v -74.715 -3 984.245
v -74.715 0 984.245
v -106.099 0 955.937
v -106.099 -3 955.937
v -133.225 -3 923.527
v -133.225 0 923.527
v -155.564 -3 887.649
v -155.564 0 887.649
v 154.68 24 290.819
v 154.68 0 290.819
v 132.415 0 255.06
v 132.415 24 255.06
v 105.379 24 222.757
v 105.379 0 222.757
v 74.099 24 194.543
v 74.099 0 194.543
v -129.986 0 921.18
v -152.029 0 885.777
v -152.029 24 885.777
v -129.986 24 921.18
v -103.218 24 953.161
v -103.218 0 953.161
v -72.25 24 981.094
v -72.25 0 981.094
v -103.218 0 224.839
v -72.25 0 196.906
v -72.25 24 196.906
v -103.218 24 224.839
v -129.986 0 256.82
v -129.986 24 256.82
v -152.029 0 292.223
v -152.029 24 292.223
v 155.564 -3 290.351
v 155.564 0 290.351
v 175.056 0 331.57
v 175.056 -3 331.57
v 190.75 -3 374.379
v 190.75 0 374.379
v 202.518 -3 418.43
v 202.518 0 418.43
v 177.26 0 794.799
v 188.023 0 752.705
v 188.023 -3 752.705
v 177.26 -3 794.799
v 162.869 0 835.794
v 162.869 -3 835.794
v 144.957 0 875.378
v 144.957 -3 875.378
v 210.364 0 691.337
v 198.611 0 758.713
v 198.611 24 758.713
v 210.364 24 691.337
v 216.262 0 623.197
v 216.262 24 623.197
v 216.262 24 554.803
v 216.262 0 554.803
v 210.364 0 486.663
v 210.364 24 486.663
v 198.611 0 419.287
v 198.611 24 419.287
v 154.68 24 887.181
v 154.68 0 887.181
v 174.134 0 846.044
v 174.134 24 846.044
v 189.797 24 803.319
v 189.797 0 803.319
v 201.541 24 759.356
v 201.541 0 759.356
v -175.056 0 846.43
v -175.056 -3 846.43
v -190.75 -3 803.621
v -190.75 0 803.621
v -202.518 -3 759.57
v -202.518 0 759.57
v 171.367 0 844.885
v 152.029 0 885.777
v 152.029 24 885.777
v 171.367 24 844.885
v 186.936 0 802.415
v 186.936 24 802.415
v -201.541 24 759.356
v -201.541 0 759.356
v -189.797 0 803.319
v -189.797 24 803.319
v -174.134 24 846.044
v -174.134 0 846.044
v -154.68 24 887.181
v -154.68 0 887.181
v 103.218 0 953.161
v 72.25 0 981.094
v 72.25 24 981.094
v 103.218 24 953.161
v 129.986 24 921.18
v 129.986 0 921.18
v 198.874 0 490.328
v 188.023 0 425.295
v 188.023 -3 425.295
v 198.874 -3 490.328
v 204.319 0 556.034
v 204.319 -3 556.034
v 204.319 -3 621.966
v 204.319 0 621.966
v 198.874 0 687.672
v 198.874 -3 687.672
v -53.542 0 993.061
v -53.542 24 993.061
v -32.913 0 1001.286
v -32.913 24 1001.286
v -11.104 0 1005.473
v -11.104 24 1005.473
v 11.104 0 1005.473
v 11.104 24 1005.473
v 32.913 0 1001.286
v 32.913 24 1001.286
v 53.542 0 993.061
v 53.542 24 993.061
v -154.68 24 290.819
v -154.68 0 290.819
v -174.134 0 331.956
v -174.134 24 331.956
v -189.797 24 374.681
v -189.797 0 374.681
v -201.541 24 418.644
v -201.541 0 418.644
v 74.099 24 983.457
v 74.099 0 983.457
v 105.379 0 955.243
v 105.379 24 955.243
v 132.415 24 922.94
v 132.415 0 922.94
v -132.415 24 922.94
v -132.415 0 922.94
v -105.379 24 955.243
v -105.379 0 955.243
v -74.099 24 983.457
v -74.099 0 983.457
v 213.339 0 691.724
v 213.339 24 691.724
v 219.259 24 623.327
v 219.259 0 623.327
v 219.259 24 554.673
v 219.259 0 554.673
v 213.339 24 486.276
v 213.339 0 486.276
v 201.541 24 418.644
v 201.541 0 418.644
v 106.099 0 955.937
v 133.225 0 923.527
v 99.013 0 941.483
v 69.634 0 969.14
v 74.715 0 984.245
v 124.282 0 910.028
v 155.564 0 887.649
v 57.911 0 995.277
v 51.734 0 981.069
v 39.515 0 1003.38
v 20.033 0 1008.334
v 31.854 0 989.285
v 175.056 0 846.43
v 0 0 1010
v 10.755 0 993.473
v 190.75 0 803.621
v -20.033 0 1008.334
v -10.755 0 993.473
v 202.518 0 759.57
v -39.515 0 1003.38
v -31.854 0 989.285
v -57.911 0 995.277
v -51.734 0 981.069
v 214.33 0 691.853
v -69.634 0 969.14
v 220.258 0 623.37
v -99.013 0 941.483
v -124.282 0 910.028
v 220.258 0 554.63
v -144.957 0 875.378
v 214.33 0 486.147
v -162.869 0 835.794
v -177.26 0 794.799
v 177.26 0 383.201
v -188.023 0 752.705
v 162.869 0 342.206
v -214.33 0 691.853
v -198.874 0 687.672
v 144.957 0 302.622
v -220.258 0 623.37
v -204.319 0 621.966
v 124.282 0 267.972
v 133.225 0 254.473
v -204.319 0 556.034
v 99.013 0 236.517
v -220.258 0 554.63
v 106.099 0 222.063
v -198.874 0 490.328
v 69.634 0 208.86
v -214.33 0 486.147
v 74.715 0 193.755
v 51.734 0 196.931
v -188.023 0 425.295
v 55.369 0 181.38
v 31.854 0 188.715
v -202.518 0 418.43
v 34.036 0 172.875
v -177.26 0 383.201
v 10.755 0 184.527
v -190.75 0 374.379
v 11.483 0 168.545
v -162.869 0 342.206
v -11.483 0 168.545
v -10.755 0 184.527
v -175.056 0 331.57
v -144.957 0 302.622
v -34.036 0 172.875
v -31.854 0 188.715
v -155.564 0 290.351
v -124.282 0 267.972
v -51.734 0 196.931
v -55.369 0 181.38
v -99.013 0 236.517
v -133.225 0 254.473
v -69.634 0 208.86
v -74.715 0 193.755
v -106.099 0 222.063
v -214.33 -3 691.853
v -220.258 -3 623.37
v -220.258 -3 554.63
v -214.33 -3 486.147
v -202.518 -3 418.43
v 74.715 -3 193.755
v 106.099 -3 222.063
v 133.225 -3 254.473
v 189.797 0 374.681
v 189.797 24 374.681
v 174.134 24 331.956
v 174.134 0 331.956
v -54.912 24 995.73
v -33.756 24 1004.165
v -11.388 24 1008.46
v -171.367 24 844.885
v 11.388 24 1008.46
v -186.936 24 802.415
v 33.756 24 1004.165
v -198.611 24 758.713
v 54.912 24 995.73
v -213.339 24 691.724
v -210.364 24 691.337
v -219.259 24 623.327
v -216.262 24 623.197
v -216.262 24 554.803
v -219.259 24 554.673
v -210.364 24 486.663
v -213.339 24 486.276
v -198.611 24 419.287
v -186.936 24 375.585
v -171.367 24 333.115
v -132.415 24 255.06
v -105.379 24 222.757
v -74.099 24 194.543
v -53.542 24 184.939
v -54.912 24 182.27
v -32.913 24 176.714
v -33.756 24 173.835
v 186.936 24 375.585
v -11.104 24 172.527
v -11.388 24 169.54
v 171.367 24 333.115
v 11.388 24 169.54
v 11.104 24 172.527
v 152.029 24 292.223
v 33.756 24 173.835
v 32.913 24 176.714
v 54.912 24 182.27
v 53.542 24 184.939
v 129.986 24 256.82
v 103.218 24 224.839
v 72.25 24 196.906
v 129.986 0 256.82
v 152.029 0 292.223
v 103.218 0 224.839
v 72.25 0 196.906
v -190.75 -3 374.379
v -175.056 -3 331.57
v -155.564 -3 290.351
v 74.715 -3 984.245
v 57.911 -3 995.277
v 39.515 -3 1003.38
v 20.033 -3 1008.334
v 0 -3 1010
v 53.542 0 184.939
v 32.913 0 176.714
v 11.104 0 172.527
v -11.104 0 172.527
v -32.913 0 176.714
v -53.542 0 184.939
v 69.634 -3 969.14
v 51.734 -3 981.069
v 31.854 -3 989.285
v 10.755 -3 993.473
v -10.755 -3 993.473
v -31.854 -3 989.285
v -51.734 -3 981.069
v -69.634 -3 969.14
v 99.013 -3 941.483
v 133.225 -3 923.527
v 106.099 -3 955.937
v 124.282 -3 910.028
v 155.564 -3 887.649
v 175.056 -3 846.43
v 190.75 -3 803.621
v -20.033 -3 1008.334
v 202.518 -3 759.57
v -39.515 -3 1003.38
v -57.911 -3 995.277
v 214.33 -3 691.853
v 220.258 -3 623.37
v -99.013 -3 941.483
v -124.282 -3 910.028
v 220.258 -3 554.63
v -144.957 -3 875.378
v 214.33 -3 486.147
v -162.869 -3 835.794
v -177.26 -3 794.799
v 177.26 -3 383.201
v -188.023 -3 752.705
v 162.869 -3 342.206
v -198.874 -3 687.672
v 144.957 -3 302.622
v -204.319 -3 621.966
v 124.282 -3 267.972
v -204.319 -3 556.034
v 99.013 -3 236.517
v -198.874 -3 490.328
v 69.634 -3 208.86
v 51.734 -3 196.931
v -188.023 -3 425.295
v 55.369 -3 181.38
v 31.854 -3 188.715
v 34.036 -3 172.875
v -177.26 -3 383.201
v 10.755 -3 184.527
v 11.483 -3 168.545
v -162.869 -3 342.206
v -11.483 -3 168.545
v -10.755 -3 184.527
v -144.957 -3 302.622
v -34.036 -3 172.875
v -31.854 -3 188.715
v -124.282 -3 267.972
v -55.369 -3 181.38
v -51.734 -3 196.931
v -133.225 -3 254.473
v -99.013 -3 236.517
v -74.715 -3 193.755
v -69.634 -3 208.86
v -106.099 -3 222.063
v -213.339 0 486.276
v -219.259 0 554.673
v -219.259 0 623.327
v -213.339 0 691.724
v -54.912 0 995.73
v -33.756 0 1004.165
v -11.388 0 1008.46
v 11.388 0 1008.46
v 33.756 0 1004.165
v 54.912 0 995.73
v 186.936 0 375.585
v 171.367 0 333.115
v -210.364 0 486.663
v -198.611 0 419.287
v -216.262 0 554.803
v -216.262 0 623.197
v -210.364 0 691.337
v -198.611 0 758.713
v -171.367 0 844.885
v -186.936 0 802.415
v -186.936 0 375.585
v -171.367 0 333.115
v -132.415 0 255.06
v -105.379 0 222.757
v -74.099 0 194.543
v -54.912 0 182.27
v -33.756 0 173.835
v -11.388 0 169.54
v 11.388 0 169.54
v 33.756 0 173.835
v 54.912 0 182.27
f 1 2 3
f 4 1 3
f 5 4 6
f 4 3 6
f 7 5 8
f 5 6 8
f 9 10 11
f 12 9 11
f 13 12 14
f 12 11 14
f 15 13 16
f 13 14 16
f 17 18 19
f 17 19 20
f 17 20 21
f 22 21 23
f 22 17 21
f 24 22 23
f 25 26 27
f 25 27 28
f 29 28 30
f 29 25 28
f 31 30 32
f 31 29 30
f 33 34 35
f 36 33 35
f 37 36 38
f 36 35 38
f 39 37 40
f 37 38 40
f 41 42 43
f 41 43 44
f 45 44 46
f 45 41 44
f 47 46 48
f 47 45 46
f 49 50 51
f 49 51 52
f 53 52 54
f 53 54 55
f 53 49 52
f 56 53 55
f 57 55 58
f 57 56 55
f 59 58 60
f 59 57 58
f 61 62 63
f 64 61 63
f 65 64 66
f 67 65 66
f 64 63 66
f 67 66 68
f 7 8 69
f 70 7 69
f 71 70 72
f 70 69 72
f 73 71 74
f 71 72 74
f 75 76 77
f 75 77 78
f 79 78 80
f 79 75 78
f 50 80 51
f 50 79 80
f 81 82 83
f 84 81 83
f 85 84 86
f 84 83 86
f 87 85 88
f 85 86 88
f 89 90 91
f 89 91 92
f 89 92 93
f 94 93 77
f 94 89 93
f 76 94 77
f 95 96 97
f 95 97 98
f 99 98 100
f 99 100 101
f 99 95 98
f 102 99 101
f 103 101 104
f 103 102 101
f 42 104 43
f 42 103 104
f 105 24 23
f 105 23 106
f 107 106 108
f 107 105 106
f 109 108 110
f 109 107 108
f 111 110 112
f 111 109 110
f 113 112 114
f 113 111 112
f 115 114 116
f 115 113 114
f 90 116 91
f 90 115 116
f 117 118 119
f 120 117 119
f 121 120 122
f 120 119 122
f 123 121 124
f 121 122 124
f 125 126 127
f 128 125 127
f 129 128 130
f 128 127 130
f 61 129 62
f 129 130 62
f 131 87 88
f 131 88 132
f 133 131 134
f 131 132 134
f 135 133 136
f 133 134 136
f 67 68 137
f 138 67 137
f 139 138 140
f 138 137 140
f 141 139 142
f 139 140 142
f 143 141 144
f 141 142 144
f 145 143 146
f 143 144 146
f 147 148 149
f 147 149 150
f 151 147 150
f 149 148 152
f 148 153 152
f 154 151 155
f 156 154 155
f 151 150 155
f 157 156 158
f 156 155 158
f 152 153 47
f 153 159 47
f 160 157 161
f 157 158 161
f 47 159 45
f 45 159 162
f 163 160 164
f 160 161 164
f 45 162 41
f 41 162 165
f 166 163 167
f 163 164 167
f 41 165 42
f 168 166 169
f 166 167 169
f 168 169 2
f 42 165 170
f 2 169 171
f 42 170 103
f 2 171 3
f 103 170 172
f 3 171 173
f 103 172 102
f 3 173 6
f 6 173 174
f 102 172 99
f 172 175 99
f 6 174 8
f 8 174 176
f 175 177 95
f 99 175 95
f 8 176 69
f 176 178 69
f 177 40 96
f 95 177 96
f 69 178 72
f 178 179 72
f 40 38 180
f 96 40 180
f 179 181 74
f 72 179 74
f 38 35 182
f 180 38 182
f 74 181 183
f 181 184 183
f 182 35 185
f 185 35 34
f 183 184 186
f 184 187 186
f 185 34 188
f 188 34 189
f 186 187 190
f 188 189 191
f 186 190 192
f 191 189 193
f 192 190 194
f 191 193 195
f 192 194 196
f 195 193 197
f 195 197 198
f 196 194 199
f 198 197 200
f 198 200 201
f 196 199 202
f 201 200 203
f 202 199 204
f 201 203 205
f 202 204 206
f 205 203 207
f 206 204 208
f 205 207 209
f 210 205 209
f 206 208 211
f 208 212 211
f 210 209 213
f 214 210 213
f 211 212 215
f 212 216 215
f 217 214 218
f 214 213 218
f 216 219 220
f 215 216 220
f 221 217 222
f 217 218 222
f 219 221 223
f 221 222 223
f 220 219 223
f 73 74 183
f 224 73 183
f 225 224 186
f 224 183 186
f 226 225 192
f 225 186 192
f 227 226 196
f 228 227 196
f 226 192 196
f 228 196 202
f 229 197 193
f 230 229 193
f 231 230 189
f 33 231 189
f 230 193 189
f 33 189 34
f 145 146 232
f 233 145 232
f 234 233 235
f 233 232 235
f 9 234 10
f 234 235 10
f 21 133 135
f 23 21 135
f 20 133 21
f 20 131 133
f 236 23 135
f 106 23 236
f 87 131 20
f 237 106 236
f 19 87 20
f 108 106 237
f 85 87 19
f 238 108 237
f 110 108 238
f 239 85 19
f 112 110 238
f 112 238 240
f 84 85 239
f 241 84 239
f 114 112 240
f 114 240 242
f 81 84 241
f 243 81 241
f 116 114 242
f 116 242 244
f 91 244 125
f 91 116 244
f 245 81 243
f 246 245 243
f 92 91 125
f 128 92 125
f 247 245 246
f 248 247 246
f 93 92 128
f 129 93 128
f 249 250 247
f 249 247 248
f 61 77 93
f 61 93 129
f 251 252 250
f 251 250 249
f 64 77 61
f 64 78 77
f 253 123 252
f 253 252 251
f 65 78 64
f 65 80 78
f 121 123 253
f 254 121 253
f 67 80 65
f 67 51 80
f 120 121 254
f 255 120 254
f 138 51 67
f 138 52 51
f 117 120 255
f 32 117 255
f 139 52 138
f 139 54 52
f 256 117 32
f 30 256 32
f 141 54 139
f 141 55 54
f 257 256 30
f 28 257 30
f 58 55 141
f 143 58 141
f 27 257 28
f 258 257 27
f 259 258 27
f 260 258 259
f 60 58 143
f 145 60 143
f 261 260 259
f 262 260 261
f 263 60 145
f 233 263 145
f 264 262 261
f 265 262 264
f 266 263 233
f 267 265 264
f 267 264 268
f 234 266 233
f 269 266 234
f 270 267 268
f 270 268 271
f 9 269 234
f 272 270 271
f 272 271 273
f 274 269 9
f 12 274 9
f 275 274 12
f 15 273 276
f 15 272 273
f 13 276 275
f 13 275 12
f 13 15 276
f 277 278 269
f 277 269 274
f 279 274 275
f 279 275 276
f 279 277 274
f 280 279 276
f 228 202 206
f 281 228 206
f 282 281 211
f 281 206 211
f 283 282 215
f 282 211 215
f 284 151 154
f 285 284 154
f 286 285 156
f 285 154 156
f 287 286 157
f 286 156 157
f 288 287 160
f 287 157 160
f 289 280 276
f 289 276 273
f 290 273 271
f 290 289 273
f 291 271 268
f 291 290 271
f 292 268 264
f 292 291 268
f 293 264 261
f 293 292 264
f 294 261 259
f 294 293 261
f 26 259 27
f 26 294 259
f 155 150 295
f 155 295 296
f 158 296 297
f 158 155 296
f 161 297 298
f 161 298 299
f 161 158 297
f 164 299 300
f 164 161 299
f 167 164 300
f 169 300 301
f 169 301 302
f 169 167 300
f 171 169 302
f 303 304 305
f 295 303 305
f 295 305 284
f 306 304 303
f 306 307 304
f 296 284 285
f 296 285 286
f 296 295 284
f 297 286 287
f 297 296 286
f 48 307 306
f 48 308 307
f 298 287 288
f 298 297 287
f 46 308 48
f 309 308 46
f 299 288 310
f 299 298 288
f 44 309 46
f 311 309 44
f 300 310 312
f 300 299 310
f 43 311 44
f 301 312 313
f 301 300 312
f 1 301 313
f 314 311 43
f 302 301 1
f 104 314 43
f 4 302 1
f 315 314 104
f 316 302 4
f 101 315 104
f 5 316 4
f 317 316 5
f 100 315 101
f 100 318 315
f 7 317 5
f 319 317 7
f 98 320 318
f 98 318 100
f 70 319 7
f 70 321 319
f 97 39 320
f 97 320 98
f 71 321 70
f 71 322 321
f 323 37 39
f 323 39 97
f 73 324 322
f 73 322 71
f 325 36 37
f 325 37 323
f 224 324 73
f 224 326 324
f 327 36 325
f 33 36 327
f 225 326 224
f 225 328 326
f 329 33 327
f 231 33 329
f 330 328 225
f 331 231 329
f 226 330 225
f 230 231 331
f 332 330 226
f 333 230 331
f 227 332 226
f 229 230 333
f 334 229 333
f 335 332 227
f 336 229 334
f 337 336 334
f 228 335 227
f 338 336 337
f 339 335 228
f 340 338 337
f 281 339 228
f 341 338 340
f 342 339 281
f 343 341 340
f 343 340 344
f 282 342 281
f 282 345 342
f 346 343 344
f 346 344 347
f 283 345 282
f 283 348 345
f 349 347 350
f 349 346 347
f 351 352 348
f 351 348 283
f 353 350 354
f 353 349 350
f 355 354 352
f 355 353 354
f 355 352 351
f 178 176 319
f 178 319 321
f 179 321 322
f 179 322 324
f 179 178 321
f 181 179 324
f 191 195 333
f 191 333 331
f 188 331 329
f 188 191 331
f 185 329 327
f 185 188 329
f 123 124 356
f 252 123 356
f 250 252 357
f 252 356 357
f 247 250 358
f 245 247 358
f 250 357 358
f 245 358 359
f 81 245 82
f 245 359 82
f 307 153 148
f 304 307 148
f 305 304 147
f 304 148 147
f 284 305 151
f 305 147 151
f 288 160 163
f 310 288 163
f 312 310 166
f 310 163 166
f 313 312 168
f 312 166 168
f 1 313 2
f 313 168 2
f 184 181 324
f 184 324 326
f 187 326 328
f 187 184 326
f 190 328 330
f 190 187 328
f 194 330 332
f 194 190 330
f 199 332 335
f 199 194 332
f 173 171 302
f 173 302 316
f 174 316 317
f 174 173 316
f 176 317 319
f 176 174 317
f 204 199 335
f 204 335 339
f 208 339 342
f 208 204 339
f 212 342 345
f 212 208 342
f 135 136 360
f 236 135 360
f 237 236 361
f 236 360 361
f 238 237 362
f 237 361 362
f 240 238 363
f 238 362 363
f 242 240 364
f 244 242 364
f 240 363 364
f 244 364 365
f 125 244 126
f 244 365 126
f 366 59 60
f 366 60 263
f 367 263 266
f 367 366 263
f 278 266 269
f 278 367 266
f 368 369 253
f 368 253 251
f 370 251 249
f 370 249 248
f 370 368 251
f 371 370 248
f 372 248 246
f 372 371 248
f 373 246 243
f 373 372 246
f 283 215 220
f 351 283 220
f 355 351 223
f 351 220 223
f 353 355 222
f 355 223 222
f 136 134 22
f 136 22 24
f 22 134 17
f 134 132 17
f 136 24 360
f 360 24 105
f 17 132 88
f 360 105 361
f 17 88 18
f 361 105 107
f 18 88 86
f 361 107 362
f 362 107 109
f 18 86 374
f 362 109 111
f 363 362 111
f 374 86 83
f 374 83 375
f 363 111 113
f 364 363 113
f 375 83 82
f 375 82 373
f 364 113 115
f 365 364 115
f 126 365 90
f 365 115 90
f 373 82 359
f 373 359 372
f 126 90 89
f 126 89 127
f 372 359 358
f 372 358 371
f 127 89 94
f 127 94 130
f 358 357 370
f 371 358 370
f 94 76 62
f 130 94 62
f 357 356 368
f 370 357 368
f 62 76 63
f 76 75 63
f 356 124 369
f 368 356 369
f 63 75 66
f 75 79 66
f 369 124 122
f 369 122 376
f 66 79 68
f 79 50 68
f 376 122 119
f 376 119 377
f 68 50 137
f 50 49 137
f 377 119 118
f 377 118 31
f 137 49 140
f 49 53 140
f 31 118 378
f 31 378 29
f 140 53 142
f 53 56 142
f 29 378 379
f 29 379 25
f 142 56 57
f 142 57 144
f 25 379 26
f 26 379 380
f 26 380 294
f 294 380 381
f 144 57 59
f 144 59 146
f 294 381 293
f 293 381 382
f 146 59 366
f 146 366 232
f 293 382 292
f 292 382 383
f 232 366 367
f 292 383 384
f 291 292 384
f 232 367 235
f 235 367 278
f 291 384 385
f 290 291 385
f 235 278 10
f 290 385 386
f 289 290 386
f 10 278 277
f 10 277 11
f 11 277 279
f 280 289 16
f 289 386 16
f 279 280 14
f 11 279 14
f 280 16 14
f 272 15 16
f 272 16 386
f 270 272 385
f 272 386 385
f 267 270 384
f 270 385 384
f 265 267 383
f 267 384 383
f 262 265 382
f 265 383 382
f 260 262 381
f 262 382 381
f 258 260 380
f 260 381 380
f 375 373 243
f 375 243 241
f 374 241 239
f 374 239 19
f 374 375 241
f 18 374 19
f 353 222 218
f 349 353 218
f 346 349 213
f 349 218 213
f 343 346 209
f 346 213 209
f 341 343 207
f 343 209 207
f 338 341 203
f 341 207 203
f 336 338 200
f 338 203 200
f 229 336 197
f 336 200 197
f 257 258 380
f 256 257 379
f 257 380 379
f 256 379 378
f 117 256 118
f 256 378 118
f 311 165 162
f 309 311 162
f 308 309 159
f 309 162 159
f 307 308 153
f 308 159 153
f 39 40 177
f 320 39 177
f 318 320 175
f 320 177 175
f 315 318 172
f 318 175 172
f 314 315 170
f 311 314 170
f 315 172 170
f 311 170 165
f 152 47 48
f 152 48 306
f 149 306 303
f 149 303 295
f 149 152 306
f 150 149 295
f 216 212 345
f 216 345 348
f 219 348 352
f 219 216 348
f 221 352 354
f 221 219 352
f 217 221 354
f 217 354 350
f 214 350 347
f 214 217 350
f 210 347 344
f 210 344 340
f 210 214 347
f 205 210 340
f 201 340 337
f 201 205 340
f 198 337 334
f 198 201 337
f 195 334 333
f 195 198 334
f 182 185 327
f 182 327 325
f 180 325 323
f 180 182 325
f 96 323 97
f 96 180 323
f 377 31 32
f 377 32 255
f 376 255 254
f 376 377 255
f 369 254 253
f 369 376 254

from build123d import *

# Parameters (mm, degrees)
AUFSATZ_LINEAR_AUSTRAGEN1_DEPTH = 3
AUFSATZ_LINEAR_AUSTRAGEN2_DEPTH = 24


with BuildPart() as part:
    # Skizze6 → Aufsatz-Linear austragen1 (new body)
    with BuildSketch(Plane(origin=(0, 0, 0), x_dir=(1, 0, 0), z_dir=(0, 1, 0))):
        with BuildLine():
            ThreePointArc((74.715017555, -984.244606231), (39.514788866, -1003.380457082), (0, -1010))
            ThreePointArc((0, -1010), (-39.514788866, -1003.380457082), (-74.715017555, -984.244606231))
            ThreePointArc((-74.715017555, -984.244606231), (-120.229343231, -940.206746616), (-155.564200335, -887.64882814))
            ThreePointArc((-155.564200335, -887.64882814), (-183.386784686, -825.20269993), (-202.517873317, -759.570264533))
            ThreePointArc((-202.517873317, -759.570264533), (-221.000459131, -589), (-202.517873317, -418.429735467))
            ThreePointArc((-202.517873317, -418.429735467), (-183.386784686, -352.79730007), (-155.564200335, -290.35117186))
            ThreePointArc((-155.564200335, -290.35117186), (-120.229343231, -237.793253384), (-74.715017555, -193.755393769))
            ThreePointArc((-74.715017555, -193.755393769), (0, -168), (74.715017555, -193.755393769))
            ThreePointArc((74.715017555, -193.755393769), (120.22934323, -237.793253384), (155.564200335, -290.35117186))
            ThreePointArc((155.564200335, -290.35117186), (183.386784686, -352.79730007), (202.517873317, -418.429735467))
            ThreePointArc((202.517873317, -418.429735467), (221.000459131, -589), (202.517873317, -759.570264533))
            ThreePointArc((202.517873317, -759.570264533), (183.386784686, -825.20269993), (155.564200335, -887.64882814))
            ThreePointArc((155.564200335, -887.64882814), (120.229343231, -940.206746616), (74.715017555, -984.244606231))
        make_face()
        with BuildLine():
            ThreePointArc((69.633932259, -969.139895548), (0, -994), (-69.633932259, -969.139895548))
            ThreePointArc((-69.633932259, -969.139895548), (-112.193543045, -926.193933206), (-144.95696967, -875.378246381))
            ThreePointArc((-144.95696967, -875.378246381), (-170.511926155, -815.453351782), (-188.023213714, -752.704617917))
            ThreePointArc((-188.023213714, -752.704617917), (-205.000112468, -589), (-188.023213714, -425.295382084))
            ThreePointArc((-188.023213714, -425.295382084), (-170.511926155, -362.546648219), (-144.95696967, -302.621753619))
            ThreePointArc((-144.95696967, -302.621753619), (-112.193543045, -251.806066794), (-69.633932259, -208.860104452))
            ThreePointArc((-69.633932259, -208.860104452), (0, -184), (69.633932259, -208.860104452))
            ThreePointArc((69.633932259, -208.860104452), (112.193543044, -251.806066794), (144.95696967, -302.621753619))
            ThreePointArc((144.95696967, -302.621753619), (170.511926155, -362.546648218), (188.023213714, -425.295382083))
            ThreePointArc((188.023213714, -425.295382083), (205.000112468, -589), (188.023213714, -752.704617917))
            ThreePointArc((188.023213714, -752.704617917), (170.511926155, -815.453351782), (144.95696967, -875.378246381))
            ThreePointArc((144.95696967, -875.378246381), (112.193543044, -926.193933206), (69.633932259, -969.139895548))
        make_face(mode=Mode.SUBTRACT)
    extrude(amount=-AUFSATZ_LINEAR_AUSTRAGEN1_DEPTH)


with BuildPart() as body_2:
    # Skizze7 → Aufsatz-Linear austragen2 (new body)
    with BuildSketch(Plane(origin=(0, 0, 0), x_dir=(1, 0, 0), z_dir=(0, 1, 0))):
        with BuildLine():
            ThreePointArc((74.098810354, -983.45702215), (119.462500767, -939.564911251), (154.680412814, -887.180939674))
            ThreePointArc((154.680412814, -887.180939674), (182.44788831, -824.858499994), (201.541083539, -759.356064322))
            ThreePointArc((201.541083539, -759.356064322), (220.000459131, -589), (201.541083539, -418.643935678))
            ThreePointArc((201.541083539, -418.643935678), (182.44788831, -353.141500006), (154.680412814, -290.819060326))
            ThreePointArc((154.680412814, -290.819060326), (119.462500767, -238.435088749), (74.098810353, -194.54297785))
            ThreePointArc((74.098810353, -194.54297785), (0, -169), (-74.098810353, -194.54297785))
            ThreePointArc((-74.098810353, -194.54297785), (-119.462500767, -238.435088749), (-154.680412814, -290.819060327))
            ThreePointArc((-154.680412814, -290.819060327), (-182.447888311, -353.141500006), (-201.54108354, -418.643935678))
            ThreePointArc((-201.54108354, -418.643935678), (-220.000459131, -589), (-201.54108354, -759.356064322))
            ThreePointArc((-201.54108354, -759.356064322), (-182.447888311, -824.858499994), (-154.680412814, -887.180939674))
            ThreePointArc((-154.680412814, -887.180939674), (-119.462500767, -939.564911251), (-74.098810354, -983.45702215))
            ThreePointArc((-74.098810354, -983.45702215), (0, -1009), (74.098810354, -983.45702215))
        make_face()
        with BuildLine():
            ThreePointArc((72.250188748, -981.094269907), (117.161973376, -937.639405155), (152.029050249, -885.777274275))
            ThreePointArc((152.029050249, -885.777274275), (179.631199184, -823.825900187), (198.610714207, -758.713463688))
            ThreePointArc((198.610714207, -758.713463688), (217.000459131, -589), (198.610714207, -419.286536312))
            ThreePointArc((198.610714207, -419.286536312), (179.631199184, -354.174099814), (152.029050249, -292.222725725))
            ThreePointArc((152.029050249, -292.222725725), (117.161973376, -240.360594845), (72.250188748, -196.905730093))
            ThreePointArc((72.250188748, -196.905730093), (0, -172), (-72.250188748, -196.905730093))
            ThreePointArc((-72.250188748, -196.905730093), (-117.161973376, -240.360594845), (-152.029050249, -292.222725725))
            ThreePointArc((-152.029050249, -292.222725725), (-179.631199184, -354.174099814), (-198.610714207, -419.286536312))
            ThreePointArc((-198.610714207, -419.286536312), (-217.000459131, -589), (-198.610714207, -758.713463688))
            ThreePointArc((-198.610714207, -758.713463688), (-179.631199184, -823.825900187), (-152.029050249, -885.777274275))
            ThreePointArc((-152.029050249, -885.777274275), (-117.161973376, -937.639405155), (-72.250188748, -981.094269907))
            ThreePointArc((-72.250188748, -981.094269907), (0, -1006), (72.250188748, -981.094269907))
        make_face(mode=Mode.SUBTRACT)
    extrude(amount=AUFSATZ_LINEAR_AUSTRAGEN2_DEPTH)


solid = Compound([part.part, body_2.part])
